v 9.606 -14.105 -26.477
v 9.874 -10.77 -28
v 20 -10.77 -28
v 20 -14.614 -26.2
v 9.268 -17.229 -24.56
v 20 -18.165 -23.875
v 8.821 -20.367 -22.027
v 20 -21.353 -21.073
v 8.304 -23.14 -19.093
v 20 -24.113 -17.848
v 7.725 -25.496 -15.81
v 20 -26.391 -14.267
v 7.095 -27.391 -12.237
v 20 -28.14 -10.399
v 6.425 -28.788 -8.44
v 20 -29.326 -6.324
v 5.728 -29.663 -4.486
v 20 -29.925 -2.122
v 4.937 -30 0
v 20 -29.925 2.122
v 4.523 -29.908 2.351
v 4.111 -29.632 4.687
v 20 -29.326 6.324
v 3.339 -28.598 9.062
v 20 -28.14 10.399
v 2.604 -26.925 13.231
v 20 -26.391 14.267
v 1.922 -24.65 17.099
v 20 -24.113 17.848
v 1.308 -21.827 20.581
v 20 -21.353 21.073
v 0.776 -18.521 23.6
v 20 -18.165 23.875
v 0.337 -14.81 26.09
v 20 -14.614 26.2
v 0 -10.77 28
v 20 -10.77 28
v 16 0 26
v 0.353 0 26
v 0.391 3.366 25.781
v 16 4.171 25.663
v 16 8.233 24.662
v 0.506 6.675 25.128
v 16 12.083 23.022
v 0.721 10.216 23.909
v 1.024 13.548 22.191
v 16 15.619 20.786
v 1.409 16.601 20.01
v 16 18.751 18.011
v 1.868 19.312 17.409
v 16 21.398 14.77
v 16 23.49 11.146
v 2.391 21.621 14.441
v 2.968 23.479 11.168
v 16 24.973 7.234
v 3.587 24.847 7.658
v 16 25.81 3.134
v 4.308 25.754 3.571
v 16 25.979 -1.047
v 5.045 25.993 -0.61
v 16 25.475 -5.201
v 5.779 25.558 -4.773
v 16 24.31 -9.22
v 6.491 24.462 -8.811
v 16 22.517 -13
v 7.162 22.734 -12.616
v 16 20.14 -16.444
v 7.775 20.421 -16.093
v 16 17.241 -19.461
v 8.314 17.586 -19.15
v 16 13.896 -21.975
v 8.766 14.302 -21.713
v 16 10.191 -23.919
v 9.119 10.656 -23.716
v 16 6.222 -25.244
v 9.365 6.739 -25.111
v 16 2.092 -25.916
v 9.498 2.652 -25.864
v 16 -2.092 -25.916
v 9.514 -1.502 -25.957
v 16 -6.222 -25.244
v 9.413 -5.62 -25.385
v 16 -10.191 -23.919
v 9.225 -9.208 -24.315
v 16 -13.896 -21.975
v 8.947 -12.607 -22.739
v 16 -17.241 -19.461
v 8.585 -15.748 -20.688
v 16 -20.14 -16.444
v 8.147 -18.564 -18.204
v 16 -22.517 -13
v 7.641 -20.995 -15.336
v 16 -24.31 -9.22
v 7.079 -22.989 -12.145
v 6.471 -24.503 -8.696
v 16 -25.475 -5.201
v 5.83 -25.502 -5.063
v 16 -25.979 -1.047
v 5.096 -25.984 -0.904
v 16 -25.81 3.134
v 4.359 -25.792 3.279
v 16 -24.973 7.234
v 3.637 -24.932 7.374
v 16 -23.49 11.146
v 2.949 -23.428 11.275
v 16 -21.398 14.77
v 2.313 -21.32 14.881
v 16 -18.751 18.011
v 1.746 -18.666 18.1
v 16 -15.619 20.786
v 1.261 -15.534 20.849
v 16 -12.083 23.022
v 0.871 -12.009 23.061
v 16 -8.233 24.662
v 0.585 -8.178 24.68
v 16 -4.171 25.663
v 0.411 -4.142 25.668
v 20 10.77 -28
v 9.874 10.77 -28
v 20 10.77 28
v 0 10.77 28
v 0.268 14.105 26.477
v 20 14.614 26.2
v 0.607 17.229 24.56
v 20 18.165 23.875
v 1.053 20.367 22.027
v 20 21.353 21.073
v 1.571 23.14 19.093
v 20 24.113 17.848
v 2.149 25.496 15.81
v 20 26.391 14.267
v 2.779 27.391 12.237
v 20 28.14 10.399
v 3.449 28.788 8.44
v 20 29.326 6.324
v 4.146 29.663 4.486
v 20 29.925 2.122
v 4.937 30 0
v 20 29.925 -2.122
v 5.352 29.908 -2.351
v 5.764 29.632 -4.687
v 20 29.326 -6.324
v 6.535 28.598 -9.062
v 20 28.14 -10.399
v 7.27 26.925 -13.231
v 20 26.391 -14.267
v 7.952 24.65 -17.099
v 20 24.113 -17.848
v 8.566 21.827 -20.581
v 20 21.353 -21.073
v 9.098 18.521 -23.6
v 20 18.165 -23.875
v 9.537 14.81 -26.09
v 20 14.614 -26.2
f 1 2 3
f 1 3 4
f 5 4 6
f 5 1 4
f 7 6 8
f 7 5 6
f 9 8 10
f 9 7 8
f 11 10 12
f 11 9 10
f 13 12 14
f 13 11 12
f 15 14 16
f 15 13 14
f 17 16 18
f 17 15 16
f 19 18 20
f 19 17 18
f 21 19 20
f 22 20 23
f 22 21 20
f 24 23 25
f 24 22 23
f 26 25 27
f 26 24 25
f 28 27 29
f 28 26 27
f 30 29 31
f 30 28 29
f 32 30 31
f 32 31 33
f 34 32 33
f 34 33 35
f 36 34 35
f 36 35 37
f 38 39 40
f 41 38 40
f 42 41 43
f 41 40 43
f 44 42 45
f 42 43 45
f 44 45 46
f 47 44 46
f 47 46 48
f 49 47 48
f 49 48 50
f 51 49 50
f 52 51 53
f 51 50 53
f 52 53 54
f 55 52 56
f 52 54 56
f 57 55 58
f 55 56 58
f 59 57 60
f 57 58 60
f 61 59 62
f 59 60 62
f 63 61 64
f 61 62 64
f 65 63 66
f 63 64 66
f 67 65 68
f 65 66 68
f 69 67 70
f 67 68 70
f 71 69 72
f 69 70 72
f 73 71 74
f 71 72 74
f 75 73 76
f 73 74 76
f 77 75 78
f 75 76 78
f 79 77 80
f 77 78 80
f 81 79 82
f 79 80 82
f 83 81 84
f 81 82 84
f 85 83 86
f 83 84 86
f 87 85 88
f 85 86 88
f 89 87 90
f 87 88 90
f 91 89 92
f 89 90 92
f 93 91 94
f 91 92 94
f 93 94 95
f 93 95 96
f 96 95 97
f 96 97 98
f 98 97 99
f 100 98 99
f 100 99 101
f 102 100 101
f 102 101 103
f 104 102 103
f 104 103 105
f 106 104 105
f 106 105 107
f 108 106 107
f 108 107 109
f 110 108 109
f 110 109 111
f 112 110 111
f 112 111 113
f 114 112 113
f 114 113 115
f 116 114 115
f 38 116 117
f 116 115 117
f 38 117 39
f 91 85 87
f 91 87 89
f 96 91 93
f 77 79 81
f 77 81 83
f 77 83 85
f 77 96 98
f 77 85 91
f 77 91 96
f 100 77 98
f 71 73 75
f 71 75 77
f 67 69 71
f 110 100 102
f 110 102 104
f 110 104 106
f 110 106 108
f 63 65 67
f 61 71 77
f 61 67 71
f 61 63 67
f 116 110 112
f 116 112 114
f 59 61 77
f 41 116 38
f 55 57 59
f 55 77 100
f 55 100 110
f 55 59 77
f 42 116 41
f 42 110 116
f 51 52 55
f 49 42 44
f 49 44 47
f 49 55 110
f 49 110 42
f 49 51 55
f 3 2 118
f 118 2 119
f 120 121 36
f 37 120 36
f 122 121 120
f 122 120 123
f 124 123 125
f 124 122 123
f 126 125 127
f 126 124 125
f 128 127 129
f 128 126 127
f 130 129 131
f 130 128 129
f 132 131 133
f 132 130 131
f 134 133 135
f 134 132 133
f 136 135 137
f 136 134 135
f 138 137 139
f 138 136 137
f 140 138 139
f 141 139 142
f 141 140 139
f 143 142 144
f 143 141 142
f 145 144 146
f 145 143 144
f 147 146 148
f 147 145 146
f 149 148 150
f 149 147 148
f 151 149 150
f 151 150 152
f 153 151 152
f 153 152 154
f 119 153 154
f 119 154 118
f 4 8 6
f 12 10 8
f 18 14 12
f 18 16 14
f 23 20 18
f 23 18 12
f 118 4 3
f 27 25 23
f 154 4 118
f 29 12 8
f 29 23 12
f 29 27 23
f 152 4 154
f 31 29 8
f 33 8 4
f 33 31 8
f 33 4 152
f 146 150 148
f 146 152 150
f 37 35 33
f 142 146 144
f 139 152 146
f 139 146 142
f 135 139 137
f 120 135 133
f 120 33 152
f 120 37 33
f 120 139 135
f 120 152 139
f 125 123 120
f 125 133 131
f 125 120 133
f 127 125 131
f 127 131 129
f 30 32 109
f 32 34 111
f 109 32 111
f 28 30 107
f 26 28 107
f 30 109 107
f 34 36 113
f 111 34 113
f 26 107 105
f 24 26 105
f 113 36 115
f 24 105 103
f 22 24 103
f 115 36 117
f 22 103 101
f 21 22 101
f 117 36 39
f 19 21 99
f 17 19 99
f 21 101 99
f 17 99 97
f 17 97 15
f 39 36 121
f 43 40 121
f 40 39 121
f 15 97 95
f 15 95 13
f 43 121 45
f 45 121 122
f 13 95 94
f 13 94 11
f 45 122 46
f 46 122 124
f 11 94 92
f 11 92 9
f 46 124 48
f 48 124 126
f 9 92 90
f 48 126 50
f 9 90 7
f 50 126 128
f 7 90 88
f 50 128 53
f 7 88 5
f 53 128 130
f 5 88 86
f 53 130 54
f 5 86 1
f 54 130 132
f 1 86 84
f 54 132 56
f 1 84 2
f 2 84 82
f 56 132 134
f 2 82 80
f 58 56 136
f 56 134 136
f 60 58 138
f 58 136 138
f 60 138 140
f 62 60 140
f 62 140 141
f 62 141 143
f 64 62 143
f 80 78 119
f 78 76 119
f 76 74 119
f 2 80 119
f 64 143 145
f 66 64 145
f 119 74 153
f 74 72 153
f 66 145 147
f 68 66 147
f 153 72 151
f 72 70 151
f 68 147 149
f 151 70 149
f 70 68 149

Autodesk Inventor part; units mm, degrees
ref_plane "YZ Plane" through (0, 0, 0) normal (1, 0, 0) x (0, 1, 0)
ref_plane "XY Plane" through (0, 0, 0) normal (0, 0, 1) x (1, 0, 0)
sketch "Эскиз1" plane through (0, 0, 0) normal (0, 0, 1) x (1, 0, 0)
  line L0 (0, 0) -> (20, 0)
  line L1 (20, 0) -> (20, 30)
  line L2 (20, 30) -> (0, 30)
  line L3 (0, 30) -> (0, 0)
  dimension "d0" = 20
  dimension "d1" = 30
revolve "Вращение1" add sketch "Эскиз1" angle 360 about axis through (0, 0, 0) along (1, 0, 0)
sketch "Эскиз2" plane through (0, 0, 0) normal (-1, 0, 0) x (0, 0, 1)
  circle A0 centre (0, 0) radius 26
  dimension "d3" = 52
extrude "Выдавливание1" cut sketch "Эскиз2" against normal blind 16
sketch "Эскиз3" plane through (0, 0, 0) normal (-1, 0, 0) x (0, 0, 1)
  line L0 (28, -30) -> (-28, -30)
  line L1 (-28, -30) -> (-28, 30)
  line L2 (-28, 30) -> (28, 30)
  line L3 (28, 30) -> (28, -30)
  circle A0 centre (0, 0) radius 30 construction
  point P0 (0, 30)
  dimension "d6" = 56
extrude "Выдавливание2" cut sketch "Эскиз3" against normal blind 20 keep common part
ref_plane "РабПлоскость1" through (0, 30, 0) normal (0, 1, 0) x (-1, 0, 0)
sketch "Эскиз4" plane through (0, 30, 0) normal (0, 1, 0) x (-1, 0, 0)
  line L0 (-20, 28) -> (0, 28) construction
  line L1 (0, -28) -> (-20, -28) construction
  line L2 (0, -28) -> (0, 28) construction
  line L3 (-20, 28) -> (0, 28) projected
  line L4 (-20, -28) -> (-20, 28) construction
  line L5 (0, 28) -> (0, -28) projected
  line L6 (0, 28) -> (-9.8743, -28)
  line L7 (0, -28) -> (-20, -28) projected
  line L8 (0, -28) -> (-9.8743, -28)
  line L9 (0, -28) -> (0, 28)
  point P0 (0, 0)
  dimension "d10" = 10
extrude "Выдавливание3" cut sketch "Эскиз4" against normal blind 60
properties part number "711123"
